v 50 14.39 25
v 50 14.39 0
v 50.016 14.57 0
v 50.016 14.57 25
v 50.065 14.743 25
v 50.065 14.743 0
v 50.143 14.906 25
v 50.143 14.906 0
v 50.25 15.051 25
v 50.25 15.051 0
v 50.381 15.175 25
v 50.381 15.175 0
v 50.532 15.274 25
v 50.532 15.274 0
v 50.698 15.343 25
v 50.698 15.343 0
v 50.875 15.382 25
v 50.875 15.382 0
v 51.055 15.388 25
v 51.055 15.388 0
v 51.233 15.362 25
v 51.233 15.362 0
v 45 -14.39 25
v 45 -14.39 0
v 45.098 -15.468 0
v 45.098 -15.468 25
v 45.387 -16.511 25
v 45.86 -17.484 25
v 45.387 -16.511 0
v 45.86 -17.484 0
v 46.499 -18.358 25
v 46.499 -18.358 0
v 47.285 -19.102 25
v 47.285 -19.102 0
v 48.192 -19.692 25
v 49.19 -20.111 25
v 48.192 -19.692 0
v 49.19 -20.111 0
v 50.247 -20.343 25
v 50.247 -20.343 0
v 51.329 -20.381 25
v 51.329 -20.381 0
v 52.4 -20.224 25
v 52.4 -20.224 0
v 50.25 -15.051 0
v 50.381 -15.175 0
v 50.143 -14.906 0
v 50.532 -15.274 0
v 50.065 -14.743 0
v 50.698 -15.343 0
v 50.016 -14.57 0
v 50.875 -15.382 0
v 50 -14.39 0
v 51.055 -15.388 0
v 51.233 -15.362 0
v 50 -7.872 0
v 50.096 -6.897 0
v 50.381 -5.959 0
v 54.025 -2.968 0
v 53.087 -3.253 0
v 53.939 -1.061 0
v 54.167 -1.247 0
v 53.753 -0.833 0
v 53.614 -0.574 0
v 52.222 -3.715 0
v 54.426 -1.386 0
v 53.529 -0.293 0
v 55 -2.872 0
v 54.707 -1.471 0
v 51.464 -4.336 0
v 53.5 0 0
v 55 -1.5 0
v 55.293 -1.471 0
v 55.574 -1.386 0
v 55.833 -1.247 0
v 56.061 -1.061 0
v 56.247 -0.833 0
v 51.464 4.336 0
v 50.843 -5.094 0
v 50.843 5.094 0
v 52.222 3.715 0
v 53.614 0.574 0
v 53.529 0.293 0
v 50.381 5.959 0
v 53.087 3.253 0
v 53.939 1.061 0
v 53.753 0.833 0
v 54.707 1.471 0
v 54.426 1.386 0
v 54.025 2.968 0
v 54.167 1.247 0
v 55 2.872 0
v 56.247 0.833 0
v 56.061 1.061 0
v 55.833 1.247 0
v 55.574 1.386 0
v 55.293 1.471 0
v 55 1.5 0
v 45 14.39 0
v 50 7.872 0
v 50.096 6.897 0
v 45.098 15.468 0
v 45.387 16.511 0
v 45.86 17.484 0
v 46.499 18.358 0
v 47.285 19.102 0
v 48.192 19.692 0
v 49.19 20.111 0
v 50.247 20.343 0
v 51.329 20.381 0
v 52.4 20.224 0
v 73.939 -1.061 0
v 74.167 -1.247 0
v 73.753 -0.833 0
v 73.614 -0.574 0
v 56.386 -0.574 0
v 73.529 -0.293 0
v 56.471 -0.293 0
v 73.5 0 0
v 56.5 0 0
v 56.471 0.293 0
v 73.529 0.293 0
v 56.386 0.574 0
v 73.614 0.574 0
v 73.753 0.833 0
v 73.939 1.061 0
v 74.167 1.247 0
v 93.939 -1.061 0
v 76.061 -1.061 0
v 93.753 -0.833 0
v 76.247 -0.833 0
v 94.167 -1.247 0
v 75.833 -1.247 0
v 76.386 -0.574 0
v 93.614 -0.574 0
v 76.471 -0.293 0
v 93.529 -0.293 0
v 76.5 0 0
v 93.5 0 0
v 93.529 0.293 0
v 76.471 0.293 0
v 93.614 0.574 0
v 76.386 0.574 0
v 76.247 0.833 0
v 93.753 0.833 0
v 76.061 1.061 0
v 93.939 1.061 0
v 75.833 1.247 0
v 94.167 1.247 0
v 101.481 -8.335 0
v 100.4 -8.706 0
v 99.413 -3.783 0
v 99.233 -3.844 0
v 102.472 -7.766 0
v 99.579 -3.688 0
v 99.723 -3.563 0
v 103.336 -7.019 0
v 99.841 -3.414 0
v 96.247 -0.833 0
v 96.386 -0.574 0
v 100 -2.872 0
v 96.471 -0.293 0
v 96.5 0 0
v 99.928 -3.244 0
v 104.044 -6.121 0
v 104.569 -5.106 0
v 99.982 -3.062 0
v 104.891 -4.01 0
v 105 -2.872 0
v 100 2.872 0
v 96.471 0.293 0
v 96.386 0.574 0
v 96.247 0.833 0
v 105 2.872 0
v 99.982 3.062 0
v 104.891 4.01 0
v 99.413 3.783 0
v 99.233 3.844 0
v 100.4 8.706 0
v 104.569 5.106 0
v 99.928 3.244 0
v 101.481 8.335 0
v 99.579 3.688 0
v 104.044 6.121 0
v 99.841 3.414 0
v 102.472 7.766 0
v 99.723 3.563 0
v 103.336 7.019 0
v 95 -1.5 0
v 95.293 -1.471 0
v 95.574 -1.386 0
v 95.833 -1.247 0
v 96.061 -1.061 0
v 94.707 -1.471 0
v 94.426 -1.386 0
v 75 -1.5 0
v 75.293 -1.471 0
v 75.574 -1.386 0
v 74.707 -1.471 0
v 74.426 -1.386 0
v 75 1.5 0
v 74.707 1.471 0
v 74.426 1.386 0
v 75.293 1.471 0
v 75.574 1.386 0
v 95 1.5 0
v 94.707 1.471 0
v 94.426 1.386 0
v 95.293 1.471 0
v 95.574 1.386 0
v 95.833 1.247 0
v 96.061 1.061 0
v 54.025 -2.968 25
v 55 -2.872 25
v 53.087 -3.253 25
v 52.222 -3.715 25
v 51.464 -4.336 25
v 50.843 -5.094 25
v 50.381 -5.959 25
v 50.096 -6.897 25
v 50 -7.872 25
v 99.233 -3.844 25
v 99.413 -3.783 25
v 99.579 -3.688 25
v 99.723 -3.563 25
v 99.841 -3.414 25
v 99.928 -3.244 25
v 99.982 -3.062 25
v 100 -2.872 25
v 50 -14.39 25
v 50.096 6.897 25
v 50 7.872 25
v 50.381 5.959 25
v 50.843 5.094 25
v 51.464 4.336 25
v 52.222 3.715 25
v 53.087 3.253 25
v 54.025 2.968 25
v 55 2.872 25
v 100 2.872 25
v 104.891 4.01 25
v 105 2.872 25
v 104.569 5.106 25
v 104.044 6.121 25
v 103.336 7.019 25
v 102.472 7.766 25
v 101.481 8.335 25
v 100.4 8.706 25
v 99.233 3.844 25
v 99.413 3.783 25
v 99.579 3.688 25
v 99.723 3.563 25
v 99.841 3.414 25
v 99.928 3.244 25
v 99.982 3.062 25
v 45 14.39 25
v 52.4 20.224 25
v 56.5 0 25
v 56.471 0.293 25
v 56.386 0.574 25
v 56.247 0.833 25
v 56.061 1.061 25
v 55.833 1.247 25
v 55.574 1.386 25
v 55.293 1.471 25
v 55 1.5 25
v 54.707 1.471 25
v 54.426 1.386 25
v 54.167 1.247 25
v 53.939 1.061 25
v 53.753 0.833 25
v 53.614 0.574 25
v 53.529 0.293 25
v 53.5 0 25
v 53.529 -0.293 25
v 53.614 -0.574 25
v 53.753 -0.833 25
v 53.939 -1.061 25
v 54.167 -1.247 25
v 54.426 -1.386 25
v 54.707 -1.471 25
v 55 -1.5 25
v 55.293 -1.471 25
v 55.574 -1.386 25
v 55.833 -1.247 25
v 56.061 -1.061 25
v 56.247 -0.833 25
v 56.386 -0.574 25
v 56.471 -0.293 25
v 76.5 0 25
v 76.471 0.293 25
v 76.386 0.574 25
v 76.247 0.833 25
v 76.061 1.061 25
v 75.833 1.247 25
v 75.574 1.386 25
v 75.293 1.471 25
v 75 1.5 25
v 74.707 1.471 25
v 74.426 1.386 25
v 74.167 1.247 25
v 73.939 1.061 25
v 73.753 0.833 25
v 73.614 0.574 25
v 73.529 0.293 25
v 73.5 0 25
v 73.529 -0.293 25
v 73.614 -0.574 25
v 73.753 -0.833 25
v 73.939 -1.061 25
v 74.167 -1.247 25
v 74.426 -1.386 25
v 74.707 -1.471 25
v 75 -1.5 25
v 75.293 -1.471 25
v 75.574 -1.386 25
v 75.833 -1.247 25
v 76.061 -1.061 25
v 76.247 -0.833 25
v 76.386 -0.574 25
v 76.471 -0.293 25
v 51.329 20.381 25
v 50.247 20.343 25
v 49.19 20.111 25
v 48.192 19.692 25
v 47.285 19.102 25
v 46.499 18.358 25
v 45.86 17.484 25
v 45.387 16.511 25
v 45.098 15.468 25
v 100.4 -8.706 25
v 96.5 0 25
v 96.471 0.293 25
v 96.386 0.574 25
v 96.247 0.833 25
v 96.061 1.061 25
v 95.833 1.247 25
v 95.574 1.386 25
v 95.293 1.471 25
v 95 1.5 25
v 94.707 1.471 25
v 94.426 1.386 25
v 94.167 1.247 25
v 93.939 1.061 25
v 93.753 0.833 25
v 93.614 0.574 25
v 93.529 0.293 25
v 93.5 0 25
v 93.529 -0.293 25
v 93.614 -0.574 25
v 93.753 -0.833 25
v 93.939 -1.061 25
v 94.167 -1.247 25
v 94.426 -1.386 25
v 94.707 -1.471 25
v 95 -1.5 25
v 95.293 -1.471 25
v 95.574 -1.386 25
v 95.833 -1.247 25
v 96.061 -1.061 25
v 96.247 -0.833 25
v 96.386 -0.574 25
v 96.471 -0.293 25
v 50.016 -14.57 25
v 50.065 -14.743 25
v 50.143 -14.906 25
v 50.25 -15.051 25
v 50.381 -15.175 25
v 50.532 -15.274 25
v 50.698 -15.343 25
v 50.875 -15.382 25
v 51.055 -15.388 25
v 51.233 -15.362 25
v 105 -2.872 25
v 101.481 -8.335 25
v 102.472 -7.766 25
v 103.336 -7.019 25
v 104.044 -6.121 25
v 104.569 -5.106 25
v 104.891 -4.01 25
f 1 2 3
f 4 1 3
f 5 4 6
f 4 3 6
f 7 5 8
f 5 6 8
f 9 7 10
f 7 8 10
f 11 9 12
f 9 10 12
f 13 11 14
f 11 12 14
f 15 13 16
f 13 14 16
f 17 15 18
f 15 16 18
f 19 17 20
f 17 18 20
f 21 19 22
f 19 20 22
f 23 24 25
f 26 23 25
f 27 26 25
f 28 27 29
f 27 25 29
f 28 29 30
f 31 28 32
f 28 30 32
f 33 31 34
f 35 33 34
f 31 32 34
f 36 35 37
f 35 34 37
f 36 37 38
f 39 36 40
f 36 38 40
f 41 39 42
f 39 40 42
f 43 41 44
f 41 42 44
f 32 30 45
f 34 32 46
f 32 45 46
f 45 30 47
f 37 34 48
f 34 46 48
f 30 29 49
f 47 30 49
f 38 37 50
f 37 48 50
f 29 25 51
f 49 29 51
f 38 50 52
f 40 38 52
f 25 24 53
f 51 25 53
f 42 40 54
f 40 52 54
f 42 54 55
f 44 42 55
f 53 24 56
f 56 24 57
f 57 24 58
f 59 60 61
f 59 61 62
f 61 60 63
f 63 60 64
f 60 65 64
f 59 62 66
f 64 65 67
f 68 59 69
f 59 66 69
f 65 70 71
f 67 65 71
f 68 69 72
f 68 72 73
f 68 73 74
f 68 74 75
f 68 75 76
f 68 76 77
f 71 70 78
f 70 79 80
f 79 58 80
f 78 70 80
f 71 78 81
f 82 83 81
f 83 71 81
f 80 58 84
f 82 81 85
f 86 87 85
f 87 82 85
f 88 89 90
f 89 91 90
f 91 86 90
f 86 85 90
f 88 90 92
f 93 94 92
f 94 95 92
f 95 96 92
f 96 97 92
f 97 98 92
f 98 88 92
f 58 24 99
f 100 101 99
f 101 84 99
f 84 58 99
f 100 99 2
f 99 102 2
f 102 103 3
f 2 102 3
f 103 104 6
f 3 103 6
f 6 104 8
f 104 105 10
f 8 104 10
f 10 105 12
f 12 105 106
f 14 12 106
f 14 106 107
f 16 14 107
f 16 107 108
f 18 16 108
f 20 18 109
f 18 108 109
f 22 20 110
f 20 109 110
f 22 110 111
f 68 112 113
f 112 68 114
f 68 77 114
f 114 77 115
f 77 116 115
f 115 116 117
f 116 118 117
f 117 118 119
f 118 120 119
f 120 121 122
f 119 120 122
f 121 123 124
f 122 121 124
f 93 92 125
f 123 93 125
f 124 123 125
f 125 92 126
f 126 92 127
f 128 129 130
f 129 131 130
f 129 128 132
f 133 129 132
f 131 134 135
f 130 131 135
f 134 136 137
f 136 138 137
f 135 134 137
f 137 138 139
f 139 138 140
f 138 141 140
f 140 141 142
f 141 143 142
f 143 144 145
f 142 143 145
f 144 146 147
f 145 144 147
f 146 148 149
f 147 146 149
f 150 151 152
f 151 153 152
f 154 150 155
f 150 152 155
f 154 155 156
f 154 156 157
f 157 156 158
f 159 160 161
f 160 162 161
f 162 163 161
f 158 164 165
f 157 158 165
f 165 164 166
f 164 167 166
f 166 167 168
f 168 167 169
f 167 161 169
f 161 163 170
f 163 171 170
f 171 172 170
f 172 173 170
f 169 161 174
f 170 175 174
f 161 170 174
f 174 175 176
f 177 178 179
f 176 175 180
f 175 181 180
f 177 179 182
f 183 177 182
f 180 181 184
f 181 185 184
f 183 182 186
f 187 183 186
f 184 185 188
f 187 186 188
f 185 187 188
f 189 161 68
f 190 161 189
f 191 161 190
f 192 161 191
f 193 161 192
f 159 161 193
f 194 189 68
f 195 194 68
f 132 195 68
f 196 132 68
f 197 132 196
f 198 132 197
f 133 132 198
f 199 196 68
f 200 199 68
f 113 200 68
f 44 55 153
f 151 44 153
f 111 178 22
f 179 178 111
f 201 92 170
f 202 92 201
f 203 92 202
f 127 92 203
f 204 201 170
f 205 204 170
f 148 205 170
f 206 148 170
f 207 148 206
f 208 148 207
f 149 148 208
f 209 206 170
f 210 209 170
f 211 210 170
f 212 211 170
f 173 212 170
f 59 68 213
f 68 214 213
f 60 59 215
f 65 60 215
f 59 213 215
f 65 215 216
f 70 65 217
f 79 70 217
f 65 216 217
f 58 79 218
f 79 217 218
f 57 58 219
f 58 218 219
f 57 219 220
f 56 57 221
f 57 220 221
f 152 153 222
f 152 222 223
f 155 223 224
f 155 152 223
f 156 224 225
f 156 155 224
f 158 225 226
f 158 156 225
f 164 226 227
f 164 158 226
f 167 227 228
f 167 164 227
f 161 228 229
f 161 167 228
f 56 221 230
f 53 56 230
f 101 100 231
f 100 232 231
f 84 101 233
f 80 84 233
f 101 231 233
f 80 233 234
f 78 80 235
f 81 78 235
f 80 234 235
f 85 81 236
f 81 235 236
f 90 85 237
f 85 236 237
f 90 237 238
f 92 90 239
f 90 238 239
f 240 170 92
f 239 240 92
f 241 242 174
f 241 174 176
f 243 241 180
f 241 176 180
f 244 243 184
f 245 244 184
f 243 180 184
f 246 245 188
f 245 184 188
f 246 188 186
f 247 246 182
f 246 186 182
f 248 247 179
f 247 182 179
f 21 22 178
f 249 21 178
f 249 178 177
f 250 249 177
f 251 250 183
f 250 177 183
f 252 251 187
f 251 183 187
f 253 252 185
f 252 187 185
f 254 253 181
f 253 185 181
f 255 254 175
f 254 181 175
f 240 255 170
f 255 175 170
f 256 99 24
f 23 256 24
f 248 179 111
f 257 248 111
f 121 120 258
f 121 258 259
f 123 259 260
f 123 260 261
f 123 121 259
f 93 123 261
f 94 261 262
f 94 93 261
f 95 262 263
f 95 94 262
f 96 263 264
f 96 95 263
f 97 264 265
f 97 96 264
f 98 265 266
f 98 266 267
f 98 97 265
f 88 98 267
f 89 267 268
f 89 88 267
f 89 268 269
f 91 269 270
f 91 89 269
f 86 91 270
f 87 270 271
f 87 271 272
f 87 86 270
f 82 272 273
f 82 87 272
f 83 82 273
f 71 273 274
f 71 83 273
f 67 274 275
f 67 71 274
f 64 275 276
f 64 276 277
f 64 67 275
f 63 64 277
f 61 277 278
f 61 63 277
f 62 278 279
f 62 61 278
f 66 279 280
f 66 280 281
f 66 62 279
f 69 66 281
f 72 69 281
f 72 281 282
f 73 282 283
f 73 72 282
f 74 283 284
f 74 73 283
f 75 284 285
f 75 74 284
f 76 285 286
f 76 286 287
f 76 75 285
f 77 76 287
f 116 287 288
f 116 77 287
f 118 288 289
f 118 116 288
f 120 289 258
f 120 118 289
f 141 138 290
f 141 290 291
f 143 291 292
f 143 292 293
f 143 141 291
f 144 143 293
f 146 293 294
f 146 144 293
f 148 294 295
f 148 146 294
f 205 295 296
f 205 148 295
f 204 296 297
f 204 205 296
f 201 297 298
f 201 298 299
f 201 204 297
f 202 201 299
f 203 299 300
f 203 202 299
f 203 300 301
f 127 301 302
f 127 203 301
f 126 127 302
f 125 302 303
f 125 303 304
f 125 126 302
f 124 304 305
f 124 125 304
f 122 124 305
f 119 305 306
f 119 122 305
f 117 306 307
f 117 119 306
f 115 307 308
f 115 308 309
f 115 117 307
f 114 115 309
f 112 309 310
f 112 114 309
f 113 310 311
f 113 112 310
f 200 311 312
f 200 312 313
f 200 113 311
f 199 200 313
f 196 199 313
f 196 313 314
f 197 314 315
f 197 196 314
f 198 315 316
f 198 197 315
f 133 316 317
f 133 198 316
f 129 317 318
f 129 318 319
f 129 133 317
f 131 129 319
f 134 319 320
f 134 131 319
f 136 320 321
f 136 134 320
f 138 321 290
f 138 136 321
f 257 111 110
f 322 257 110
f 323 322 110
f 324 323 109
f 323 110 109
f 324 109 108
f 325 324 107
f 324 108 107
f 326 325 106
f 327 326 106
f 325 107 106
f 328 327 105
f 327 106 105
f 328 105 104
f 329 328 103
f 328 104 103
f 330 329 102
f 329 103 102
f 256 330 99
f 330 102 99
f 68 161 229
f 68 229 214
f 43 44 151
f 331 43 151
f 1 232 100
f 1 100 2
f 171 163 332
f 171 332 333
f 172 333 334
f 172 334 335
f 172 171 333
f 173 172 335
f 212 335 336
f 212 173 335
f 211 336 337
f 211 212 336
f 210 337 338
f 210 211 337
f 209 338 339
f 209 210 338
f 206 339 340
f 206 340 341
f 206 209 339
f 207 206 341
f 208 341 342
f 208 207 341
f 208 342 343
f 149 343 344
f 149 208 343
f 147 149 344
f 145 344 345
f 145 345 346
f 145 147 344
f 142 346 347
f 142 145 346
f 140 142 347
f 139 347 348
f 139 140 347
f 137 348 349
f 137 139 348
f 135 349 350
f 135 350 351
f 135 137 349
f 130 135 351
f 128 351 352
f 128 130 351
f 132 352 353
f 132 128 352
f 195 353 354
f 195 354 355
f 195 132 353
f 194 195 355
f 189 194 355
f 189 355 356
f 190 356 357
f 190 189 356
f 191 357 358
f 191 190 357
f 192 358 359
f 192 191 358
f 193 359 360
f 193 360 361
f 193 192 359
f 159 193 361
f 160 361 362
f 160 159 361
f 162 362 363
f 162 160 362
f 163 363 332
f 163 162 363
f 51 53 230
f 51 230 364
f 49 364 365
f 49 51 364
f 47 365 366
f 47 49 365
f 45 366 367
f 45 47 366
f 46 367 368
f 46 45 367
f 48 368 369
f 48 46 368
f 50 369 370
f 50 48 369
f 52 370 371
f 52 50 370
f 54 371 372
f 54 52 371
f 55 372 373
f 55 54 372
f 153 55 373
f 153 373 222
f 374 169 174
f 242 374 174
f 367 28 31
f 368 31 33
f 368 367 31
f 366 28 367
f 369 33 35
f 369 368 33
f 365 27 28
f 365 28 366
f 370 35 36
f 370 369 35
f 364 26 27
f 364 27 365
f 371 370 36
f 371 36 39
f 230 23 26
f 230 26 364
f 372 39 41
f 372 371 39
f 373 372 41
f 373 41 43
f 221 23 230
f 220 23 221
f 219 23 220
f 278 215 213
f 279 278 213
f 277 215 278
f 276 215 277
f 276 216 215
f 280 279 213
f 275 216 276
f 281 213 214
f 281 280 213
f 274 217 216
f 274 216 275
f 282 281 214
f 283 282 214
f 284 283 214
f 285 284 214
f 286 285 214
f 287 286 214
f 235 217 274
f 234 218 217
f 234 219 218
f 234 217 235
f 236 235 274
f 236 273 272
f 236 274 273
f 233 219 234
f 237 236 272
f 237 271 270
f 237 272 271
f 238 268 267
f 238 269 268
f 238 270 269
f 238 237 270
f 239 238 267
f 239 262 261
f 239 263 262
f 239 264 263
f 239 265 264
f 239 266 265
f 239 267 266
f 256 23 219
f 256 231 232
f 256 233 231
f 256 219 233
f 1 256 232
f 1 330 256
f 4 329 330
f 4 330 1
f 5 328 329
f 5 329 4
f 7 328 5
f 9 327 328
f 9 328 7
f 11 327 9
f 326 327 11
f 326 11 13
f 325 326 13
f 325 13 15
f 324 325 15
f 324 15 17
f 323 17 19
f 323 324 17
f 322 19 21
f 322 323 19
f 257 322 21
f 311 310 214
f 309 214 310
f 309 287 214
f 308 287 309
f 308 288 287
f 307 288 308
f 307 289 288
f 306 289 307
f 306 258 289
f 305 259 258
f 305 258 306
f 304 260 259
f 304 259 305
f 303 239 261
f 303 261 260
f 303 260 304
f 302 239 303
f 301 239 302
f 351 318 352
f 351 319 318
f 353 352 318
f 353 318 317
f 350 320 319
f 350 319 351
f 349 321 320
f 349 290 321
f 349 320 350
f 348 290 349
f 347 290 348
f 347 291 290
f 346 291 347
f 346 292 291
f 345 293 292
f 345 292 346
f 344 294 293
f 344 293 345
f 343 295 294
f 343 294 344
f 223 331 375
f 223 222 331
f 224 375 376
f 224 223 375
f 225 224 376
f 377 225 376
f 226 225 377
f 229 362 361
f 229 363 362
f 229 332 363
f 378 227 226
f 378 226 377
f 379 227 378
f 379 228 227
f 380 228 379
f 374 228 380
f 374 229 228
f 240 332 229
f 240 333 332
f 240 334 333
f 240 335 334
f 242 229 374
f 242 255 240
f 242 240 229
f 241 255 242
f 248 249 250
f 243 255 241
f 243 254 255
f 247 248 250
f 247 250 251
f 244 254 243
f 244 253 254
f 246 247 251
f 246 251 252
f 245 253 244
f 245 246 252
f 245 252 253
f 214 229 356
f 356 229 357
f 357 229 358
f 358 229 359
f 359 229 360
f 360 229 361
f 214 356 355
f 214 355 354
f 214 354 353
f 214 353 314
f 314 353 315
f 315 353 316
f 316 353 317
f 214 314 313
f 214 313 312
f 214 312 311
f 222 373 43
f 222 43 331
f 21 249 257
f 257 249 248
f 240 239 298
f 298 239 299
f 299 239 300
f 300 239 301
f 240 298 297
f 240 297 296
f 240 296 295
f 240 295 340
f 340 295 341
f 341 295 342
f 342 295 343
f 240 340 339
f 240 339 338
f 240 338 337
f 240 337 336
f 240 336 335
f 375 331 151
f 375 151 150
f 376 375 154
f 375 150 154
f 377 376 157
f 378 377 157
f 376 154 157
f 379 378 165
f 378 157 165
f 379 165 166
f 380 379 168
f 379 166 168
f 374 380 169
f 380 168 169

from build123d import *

# Parameters (mm, degrees)
SKETCH1_R           = 1.5
BOSS_EXTRUDE1_DEPTH = 25
FILLET1_R           = 5


with BuildPart() as part:
    # Sketch1 → Boss-Extrude1 (new body)
    with BuildSketch(Plane.XY):
        with BuildLine():
            Line((45, 14.389938011), (45, -14.389938011))
            ThreePointArc((45, -14.389938011), (47.285164876, -19.101625607), (52.4, -20.224318869))
            Line((52.4, -20.224318869), (100.4, -8.70638721))
            ThreePointArc((100.4, -8.70638721), (103.711687596, -6.586841476), (105, -2.872006352))
            Line((105, -2.872006352), (105, 2.872006352))
            ThreePointArc((105, 2.872006352), (103.711687596, 6.586841476), (100.4, 8.70638721))
            Line((100.4, 8.70638721), (52.4, 20.224318869))
            ThreePointArc((52.4, 20.224318869), (47.285164876, 19.101625607), (45, 14.389938011))
        make_face()
        with Locations((75, 0)):
            Circle(SKETCH1_R, mode=Mode.SUBTRACT)
        with Locations((95, 0)):
            Circle(SKETCH1_R, mode=Mode.SUBTRACT)
        with Locations((55, 0)):
            Circle(SKETCH1_R, mode=Mode.SUBTRACT)
        with BuildLine():
            Line((51.233333333, 15.362334821), (99.233333333, 3.844403161))
            ThreePointArc((99.233333333, 3.844403161), (99.785281266, 3.491145539), (100, 2.872006352))
            Line((100, 2.872006352), (50, 2.872006352))
            Line((50, 2.872006352), (50, 14.389938011))
            ThreePointArc((50, 14.389938011), (50.380860813, 15.175219277), (51.233333333, 15.362334821))
        make_face(mode=Mode.SUBTRACT)
        with BuildLine():
            Line((51.233333333, -15.362334821), (99.233333333, -3.844403161))
            ThreePointArc((99.233333333, -3.844403161), (99.785281266, -3.491145539), (100, -2.872006352))
            Line((100, -2.872006352), (50, -2.872006352))
            Line((50, -2.872006352), (50, -14.389938011))
            ThreePointArc((50, -14.389938011), (50.380860813, -15.175219277), (51.233333333, -15.362334821))
        make_face(mode=Mode.SUBTRACT)
    extrude(amount=BOSS_EXTRUDE1_DEPTH)

    # Fillet1
    fillet1_edges = [part.edges().sort_by_distance(p)[0] for p in [
        (50, -2.872006352, 12.5),
        (50, 2.872006352, 12.5),
    ]]
    fillet(fillet1_edges, radius=FILLET1_R)


solid = part.part
